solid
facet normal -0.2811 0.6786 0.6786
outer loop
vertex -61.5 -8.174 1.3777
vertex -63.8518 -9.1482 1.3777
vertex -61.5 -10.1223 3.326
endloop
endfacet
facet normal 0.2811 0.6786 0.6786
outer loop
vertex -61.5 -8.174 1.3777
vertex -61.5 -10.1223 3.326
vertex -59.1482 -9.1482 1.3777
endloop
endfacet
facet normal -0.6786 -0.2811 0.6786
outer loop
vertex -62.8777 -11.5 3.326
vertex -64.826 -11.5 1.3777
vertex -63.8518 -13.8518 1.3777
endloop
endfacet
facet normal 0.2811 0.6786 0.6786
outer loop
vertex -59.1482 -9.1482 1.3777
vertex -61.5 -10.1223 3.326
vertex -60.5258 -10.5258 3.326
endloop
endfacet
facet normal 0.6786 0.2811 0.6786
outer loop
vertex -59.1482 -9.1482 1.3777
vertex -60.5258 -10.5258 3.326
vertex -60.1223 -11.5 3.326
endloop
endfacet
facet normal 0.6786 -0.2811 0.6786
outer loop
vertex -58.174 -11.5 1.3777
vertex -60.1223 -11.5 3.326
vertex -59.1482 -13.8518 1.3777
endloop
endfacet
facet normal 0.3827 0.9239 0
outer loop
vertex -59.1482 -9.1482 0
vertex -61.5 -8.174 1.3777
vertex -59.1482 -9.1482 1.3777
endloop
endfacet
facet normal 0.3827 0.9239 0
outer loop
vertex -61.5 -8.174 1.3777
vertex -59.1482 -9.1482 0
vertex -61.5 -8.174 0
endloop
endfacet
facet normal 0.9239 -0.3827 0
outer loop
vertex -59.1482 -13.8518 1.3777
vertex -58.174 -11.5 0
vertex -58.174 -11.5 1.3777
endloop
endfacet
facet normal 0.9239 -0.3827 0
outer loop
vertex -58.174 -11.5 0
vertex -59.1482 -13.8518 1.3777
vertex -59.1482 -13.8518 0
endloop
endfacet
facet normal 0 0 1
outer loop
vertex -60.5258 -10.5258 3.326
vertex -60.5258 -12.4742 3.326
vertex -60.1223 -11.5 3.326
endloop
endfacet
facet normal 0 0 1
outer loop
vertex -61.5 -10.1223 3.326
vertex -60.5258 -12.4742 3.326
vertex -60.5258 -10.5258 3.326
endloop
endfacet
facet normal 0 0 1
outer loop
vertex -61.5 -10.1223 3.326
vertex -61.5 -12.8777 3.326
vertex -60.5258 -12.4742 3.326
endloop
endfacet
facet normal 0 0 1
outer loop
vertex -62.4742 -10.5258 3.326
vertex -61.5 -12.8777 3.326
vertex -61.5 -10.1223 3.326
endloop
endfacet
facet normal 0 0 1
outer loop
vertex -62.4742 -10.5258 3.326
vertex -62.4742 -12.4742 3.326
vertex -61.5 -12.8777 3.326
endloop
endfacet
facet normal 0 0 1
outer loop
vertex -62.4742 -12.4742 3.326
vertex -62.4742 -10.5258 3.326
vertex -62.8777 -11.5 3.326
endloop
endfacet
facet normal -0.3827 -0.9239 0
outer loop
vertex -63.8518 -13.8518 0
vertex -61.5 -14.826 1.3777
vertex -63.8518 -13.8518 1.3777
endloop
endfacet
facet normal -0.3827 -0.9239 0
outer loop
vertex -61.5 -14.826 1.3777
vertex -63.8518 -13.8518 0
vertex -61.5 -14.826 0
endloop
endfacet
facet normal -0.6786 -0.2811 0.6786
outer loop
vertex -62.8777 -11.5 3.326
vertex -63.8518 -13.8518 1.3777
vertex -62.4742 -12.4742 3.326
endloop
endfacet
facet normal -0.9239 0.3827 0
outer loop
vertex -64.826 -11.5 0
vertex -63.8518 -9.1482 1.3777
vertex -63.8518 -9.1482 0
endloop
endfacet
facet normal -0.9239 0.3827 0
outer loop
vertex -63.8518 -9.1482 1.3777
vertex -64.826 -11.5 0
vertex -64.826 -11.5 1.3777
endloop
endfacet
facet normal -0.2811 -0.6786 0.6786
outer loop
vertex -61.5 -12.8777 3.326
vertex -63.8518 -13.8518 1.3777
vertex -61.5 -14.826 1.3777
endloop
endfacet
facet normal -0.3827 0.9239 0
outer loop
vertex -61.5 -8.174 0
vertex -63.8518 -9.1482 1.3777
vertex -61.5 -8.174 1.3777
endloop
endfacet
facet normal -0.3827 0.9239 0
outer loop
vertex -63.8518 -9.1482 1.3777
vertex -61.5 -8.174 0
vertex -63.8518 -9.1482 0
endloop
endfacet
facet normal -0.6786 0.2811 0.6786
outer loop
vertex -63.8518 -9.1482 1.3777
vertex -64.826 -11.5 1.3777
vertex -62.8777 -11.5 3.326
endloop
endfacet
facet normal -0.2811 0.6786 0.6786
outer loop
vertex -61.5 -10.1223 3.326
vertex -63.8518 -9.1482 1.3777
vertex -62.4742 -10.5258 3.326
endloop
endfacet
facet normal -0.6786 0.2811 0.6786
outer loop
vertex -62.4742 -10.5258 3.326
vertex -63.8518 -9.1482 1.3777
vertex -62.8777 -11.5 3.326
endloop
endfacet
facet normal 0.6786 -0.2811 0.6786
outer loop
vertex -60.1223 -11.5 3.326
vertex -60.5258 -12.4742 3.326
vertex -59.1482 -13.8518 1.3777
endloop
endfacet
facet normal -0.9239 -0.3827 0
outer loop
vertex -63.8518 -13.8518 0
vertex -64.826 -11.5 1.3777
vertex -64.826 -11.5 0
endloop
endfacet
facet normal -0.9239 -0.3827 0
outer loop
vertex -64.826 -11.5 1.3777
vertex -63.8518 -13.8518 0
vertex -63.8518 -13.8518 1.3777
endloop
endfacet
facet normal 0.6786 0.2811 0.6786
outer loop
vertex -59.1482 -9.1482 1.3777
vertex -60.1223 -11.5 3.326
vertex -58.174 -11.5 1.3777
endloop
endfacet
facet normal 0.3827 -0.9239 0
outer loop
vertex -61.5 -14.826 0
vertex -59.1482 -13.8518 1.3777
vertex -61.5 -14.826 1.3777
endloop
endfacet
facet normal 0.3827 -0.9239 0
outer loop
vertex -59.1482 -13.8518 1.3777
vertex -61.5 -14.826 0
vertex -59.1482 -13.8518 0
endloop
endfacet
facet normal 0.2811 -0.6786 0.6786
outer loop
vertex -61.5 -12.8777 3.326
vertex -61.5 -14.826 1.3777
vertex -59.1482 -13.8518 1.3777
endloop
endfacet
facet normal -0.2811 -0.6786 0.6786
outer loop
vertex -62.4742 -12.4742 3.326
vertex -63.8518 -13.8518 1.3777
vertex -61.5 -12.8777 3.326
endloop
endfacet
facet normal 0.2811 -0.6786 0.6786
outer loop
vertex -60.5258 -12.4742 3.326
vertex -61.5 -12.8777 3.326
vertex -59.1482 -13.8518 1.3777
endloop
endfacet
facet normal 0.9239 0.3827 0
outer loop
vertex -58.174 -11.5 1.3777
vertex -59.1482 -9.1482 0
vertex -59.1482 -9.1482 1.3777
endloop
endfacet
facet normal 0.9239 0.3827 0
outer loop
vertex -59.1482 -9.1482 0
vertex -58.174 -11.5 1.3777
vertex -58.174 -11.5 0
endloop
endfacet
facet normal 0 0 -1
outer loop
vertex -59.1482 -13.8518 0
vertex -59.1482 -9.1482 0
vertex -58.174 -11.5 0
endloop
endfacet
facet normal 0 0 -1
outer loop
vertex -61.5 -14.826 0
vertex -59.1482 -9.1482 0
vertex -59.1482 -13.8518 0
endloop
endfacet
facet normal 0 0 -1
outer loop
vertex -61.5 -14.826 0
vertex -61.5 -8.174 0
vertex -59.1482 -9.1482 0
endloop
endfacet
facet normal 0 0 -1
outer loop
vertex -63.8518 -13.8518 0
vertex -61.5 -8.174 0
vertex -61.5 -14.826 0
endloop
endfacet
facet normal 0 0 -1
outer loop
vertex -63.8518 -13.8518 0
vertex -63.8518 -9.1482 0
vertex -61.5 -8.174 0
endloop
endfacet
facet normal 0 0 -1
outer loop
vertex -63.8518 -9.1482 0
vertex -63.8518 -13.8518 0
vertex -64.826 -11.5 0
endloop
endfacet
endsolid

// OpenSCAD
r=0.9;
s=4;

difference() {
	translate([-61.5,-11.5])
		scale([r,r,r])
		minkowski() {
			linear_extrude(height=0.1)
				import("abolish.dxf");
			difference() {
				sphere(r=s,$fn=8);
				translate([-s*3,-s*3,-s*6]) cube([s*6,s*6,s*6]);
			}
		}
	translate([0,0,0.3])  cylinder(1.75,6.75,6.75);
}
